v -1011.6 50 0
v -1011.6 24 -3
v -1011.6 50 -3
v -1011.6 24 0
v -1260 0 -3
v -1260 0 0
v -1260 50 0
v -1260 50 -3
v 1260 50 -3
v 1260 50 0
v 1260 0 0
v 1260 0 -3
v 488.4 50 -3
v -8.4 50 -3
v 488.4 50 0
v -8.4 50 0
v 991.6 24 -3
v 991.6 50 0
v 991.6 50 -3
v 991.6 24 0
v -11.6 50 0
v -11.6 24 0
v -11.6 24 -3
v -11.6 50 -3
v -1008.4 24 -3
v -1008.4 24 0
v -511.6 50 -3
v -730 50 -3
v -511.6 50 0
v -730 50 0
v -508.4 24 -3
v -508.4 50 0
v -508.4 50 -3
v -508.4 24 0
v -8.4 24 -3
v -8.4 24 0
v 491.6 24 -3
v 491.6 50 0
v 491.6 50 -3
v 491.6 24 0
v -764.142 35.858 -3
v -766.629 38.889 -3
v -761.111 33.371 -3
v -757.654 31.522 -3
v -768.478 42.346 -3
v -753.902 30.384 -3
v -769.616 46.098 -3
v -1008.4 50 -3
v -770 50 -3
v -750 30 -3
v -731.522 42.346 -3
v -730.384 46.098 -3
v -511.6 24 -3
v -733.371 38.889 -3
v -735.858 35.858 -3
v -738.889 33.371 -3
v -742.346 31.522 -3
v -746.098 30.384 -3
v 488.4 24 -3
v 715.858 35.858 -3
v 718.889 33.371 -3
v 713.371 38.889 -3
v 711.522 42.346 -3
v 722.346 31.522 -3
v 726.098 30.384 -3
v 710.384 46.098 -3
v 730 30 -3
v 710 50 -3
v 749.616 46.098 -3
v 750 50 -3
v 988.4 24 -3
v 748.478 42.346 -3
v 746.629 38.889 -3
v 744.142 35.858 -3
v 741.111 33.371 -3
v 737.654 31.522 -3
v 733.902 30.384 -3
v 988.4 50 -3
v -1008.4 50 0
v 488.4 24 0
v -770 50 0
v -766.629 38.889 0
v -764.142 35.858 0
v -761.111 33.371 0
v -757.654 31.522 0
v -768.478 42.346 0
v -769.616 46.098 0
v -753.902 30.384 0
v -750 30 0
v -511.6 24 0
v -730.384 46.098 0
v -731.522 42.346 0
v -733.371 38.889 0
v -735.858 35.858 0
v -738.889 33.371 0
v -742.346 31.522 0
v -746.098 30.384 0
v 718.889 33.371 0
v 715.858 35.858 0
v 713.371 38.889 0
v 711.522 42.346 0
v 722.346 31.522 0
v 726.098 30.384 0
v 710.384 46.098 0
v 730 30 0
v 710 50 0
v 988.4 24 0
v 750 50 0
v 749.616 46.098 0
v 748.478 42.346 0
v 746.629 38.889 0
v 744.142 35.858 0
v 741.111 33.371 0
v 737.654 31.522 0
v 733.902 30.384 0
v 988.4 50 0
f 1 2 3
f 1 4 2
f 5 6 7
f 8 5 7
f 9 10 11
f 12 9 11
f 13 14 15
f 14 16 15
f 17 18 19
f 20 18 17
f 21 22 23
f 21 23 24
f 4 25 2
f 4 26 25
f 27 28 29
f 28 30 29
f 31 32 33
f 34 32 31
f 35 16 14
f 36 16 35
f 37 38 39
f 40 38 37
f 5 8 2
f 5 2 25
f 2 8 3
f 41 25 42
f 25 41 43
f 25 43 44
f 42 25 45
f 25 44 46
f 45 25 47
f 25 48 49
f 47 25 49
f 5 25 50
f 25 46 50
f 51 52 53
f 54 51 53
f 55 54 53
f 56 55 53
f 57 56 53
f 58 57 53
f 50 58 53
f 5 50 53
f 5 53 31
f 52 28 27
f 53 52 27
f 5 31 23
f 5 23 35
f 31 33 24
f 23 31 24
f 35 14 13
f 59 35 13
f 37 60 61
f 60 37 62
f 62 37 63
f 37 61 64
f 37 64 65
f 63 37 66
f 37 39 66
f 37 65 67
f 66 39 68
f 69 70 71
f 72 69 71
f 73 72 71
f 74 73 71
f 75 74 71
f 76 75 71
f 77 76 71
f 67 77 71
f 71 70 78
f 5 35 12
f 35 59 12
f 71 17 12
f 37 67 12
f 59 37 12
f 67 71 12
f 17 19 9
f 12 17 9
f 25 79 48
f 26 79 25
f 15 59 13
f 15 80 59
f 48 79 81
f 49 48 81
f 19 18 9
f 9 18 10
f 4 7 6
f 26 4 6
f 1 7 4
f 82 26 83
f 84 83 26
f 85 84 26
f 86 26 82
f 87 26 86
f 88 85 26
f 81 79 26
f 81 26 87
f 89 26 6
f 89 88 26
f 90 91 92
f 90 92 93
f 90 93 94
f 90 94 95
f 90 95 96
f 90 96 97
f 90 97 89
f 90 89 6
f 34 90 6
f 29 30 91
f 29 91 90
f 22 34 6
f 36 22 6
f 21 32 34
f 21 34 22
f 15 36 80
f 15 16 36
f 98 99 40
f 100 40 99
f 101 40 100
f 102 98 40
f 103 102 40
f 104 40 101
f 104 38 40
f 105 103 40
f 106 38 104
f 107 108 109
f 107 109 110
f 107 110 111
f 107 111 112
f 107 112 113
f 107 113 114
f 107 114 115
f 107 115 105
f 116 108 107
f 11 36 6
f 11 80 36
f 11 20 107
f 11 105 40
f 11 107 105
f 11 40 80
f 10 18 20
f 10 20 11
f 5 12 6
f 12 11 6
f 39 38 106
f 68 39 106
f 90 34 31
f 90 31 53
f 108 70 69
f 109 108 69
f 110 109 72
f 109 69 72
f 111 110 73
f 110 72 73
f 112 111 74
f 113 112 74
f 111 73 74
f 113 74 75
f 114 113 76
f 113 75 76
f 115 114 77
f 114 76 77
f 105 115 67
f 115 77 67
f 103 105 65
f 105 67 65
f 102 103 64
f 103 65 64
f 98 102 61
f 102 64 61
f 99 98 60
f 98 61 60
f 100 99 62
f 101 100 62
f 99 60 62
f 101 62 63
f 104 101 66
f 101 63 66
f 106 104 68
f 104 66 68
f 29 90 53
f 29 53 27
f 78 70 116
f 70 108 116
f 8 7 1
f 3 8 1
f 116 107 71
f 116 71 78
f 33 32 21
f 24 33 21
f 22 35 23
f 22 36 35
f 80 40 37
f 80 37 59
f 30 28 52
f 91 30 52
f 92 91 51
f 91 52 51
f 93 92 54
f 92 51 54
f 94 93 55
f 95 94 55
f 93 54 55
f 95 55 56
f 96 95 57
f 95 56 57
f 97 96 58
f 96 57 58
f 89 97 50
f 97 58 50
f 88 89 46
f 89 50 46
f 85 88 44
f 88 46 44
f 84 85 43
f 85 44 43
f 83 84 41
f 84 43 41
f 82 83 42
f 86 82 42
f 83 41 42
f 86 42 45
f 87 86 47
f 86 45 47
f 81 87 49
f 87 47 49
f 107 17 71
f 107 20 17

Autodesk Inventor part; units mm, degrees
ref_plane "YZ Plane" through (0, 0, 0) normal (1, 0, 0) x (0, 1, 0)
ref_plane "XZ Plane" through (0, 0, 0) normal (0, 1, 0) x (-1, 0, 0)
ref_plane "XY Plane" through (0, 0, 0) normal (0, 0, 1) x (1, 0, 0)
sketch "Sketch8" plane through (0, 0, 0) normal (0, 0, 1) x (1, 0, 0)
  line L0 (-1260, 50) -> (1260, 50)
  line L1 (1260, 50) -> (1260, 0)
  line L2 (1260, 0) -> (-1260, 0)
  line L3 (-1260, 0) -> (-1260, 50)
  point P0 (0, 0)
  point P1 (0, 0)
  dimension "d37" = 50
  dimension "d38" = 2520
extrude "Plate5" add sketch "Sketch8" against normal blind 3
sketch "Sketch9" plane through (0, 0, 0) normal (0, 0, 1) x (1, 0, 0)
  line L0 (1260, 50) -> (-1260, 50) projected
  line L1 (-1011.6, 50) -> (-1008.4, 50)
  line L2 (-1008.4, 50) -> (-1008.4, 24)
  line L3 (-1008.4, 24) -> (-1011.6, 24)
  line L4 (-1011.6, 24) -> (-1011.6, 50)
  point P0 (0, 0)
  point P1 (-1008.4, 50)
  dimension "d40" = 248.4
  dimension "d41" = 3.2
  dimension "d42" = 26
extrude "Extrusion3" cut sketch "Sketch9" against normal through all
pattern_linear "Rectangular Pattern2" count 5 spacing 500 along (1, 0, 0) of "Extrusion3"
sketch "Sketch10" plane through (0, 0, -3) normal (0, 0, -1) x (-1, 0, 0)
  line L0 (-988.4, 50) -> (-988.4, 24) projected
  line L1 (-988.4, 24) -> (-991.6, 24) projected
  line L2 (-991.6, 24) -> (-991.6, 50) projected
  line L3 (-1260, 50) -> (-991.6, 50) projected
  line L4 (-1260, 0) -> (-1260, 50) projected
  line L5 (1260, 0) -> (-1260, 0) projected
  line L6 (1260, 50) -> (1260, 0) projected
  line L7 (1011.6, 50) -> (1260, 50) projected
  line L8 (1011.6, 50) -> (1011.6, 24) projected
  line L9 (1011.6, 24) -> (1008.4, 24) projected
  line L10 (1008.4, 24) -> (1008.4, 50) projected
  line L11 (511.6, 50) -> (1008.4, 50) projected
  line L12 (511.6, 50) -> (511.6, 24) projected
  line L13 (511.6, 24) -> (508.4, 24) projected
  line L14 (508.4, 24) -> (508.4, 50) projected
  line L15 (11.6, 50) -> (508.4, 50) projected
  line L16 (11.6, 50) -> (11.6, 24) projected
  line L17 (11.6, 24) -> (8.4, 24) projected
  line L18 (8.4, 24) -> (8.4, 50) projected
  line L19 (-488.4, 50) -> (8.4, 50) projected
  line L20 (-488.4, 50) -> (-488.4, 24) projected
  line L21 (-488.4, 24) -> (-491.6, 24) projected
  line L22 (-491.6, 24) -> (-491.6, 50) projected
  line L23 (-988.4, 50) -> (-491.6, 50) projected
  circle A0 centre (750, 50) radius 20
  line L24 (11.6, 50) -> (508.4, 50) projected
  circle A1 centre (-730, 50) radius 20
  point P0 (0, 0)
  point P1 (770, 50)
  point P2 (730, 50)
  point P3 (-710, 50)
  point P4 (-750, 50)
  dimension "d48" = 40
  dimension "d49" = 40
  dimension "d50" = 1480
  dimension "d51" = 530
extrude "Extrusion4" cut sketch "Sketch10" against normal through all contours L23 A1 | A0 L11 picked at (-735.7537, 42.481) picked at (744.2463, 42.481)
equation "\"d39\" = Thickness"
equation "\"BendReliefWidth\" = Thickness"
equation "\"BendReliefDepth\" = 0.5 * Thickness"
equation "\"CornerReliefSize\" = 4 * Thickness"
equation "\"MinimumRemnant\" = 2 * Thickness"
equation "\"TransitionRadius\" = BendRadius"
equation "\"JacobiRadiusSize\" = BendRadius"
equation "\"GapSize\" = Thickness"
equation "\"Thickness\" = 3"
equation "\"BendRadius\" = 5"
properties part number "BSH 031 stringer floor" material "09g2s"
